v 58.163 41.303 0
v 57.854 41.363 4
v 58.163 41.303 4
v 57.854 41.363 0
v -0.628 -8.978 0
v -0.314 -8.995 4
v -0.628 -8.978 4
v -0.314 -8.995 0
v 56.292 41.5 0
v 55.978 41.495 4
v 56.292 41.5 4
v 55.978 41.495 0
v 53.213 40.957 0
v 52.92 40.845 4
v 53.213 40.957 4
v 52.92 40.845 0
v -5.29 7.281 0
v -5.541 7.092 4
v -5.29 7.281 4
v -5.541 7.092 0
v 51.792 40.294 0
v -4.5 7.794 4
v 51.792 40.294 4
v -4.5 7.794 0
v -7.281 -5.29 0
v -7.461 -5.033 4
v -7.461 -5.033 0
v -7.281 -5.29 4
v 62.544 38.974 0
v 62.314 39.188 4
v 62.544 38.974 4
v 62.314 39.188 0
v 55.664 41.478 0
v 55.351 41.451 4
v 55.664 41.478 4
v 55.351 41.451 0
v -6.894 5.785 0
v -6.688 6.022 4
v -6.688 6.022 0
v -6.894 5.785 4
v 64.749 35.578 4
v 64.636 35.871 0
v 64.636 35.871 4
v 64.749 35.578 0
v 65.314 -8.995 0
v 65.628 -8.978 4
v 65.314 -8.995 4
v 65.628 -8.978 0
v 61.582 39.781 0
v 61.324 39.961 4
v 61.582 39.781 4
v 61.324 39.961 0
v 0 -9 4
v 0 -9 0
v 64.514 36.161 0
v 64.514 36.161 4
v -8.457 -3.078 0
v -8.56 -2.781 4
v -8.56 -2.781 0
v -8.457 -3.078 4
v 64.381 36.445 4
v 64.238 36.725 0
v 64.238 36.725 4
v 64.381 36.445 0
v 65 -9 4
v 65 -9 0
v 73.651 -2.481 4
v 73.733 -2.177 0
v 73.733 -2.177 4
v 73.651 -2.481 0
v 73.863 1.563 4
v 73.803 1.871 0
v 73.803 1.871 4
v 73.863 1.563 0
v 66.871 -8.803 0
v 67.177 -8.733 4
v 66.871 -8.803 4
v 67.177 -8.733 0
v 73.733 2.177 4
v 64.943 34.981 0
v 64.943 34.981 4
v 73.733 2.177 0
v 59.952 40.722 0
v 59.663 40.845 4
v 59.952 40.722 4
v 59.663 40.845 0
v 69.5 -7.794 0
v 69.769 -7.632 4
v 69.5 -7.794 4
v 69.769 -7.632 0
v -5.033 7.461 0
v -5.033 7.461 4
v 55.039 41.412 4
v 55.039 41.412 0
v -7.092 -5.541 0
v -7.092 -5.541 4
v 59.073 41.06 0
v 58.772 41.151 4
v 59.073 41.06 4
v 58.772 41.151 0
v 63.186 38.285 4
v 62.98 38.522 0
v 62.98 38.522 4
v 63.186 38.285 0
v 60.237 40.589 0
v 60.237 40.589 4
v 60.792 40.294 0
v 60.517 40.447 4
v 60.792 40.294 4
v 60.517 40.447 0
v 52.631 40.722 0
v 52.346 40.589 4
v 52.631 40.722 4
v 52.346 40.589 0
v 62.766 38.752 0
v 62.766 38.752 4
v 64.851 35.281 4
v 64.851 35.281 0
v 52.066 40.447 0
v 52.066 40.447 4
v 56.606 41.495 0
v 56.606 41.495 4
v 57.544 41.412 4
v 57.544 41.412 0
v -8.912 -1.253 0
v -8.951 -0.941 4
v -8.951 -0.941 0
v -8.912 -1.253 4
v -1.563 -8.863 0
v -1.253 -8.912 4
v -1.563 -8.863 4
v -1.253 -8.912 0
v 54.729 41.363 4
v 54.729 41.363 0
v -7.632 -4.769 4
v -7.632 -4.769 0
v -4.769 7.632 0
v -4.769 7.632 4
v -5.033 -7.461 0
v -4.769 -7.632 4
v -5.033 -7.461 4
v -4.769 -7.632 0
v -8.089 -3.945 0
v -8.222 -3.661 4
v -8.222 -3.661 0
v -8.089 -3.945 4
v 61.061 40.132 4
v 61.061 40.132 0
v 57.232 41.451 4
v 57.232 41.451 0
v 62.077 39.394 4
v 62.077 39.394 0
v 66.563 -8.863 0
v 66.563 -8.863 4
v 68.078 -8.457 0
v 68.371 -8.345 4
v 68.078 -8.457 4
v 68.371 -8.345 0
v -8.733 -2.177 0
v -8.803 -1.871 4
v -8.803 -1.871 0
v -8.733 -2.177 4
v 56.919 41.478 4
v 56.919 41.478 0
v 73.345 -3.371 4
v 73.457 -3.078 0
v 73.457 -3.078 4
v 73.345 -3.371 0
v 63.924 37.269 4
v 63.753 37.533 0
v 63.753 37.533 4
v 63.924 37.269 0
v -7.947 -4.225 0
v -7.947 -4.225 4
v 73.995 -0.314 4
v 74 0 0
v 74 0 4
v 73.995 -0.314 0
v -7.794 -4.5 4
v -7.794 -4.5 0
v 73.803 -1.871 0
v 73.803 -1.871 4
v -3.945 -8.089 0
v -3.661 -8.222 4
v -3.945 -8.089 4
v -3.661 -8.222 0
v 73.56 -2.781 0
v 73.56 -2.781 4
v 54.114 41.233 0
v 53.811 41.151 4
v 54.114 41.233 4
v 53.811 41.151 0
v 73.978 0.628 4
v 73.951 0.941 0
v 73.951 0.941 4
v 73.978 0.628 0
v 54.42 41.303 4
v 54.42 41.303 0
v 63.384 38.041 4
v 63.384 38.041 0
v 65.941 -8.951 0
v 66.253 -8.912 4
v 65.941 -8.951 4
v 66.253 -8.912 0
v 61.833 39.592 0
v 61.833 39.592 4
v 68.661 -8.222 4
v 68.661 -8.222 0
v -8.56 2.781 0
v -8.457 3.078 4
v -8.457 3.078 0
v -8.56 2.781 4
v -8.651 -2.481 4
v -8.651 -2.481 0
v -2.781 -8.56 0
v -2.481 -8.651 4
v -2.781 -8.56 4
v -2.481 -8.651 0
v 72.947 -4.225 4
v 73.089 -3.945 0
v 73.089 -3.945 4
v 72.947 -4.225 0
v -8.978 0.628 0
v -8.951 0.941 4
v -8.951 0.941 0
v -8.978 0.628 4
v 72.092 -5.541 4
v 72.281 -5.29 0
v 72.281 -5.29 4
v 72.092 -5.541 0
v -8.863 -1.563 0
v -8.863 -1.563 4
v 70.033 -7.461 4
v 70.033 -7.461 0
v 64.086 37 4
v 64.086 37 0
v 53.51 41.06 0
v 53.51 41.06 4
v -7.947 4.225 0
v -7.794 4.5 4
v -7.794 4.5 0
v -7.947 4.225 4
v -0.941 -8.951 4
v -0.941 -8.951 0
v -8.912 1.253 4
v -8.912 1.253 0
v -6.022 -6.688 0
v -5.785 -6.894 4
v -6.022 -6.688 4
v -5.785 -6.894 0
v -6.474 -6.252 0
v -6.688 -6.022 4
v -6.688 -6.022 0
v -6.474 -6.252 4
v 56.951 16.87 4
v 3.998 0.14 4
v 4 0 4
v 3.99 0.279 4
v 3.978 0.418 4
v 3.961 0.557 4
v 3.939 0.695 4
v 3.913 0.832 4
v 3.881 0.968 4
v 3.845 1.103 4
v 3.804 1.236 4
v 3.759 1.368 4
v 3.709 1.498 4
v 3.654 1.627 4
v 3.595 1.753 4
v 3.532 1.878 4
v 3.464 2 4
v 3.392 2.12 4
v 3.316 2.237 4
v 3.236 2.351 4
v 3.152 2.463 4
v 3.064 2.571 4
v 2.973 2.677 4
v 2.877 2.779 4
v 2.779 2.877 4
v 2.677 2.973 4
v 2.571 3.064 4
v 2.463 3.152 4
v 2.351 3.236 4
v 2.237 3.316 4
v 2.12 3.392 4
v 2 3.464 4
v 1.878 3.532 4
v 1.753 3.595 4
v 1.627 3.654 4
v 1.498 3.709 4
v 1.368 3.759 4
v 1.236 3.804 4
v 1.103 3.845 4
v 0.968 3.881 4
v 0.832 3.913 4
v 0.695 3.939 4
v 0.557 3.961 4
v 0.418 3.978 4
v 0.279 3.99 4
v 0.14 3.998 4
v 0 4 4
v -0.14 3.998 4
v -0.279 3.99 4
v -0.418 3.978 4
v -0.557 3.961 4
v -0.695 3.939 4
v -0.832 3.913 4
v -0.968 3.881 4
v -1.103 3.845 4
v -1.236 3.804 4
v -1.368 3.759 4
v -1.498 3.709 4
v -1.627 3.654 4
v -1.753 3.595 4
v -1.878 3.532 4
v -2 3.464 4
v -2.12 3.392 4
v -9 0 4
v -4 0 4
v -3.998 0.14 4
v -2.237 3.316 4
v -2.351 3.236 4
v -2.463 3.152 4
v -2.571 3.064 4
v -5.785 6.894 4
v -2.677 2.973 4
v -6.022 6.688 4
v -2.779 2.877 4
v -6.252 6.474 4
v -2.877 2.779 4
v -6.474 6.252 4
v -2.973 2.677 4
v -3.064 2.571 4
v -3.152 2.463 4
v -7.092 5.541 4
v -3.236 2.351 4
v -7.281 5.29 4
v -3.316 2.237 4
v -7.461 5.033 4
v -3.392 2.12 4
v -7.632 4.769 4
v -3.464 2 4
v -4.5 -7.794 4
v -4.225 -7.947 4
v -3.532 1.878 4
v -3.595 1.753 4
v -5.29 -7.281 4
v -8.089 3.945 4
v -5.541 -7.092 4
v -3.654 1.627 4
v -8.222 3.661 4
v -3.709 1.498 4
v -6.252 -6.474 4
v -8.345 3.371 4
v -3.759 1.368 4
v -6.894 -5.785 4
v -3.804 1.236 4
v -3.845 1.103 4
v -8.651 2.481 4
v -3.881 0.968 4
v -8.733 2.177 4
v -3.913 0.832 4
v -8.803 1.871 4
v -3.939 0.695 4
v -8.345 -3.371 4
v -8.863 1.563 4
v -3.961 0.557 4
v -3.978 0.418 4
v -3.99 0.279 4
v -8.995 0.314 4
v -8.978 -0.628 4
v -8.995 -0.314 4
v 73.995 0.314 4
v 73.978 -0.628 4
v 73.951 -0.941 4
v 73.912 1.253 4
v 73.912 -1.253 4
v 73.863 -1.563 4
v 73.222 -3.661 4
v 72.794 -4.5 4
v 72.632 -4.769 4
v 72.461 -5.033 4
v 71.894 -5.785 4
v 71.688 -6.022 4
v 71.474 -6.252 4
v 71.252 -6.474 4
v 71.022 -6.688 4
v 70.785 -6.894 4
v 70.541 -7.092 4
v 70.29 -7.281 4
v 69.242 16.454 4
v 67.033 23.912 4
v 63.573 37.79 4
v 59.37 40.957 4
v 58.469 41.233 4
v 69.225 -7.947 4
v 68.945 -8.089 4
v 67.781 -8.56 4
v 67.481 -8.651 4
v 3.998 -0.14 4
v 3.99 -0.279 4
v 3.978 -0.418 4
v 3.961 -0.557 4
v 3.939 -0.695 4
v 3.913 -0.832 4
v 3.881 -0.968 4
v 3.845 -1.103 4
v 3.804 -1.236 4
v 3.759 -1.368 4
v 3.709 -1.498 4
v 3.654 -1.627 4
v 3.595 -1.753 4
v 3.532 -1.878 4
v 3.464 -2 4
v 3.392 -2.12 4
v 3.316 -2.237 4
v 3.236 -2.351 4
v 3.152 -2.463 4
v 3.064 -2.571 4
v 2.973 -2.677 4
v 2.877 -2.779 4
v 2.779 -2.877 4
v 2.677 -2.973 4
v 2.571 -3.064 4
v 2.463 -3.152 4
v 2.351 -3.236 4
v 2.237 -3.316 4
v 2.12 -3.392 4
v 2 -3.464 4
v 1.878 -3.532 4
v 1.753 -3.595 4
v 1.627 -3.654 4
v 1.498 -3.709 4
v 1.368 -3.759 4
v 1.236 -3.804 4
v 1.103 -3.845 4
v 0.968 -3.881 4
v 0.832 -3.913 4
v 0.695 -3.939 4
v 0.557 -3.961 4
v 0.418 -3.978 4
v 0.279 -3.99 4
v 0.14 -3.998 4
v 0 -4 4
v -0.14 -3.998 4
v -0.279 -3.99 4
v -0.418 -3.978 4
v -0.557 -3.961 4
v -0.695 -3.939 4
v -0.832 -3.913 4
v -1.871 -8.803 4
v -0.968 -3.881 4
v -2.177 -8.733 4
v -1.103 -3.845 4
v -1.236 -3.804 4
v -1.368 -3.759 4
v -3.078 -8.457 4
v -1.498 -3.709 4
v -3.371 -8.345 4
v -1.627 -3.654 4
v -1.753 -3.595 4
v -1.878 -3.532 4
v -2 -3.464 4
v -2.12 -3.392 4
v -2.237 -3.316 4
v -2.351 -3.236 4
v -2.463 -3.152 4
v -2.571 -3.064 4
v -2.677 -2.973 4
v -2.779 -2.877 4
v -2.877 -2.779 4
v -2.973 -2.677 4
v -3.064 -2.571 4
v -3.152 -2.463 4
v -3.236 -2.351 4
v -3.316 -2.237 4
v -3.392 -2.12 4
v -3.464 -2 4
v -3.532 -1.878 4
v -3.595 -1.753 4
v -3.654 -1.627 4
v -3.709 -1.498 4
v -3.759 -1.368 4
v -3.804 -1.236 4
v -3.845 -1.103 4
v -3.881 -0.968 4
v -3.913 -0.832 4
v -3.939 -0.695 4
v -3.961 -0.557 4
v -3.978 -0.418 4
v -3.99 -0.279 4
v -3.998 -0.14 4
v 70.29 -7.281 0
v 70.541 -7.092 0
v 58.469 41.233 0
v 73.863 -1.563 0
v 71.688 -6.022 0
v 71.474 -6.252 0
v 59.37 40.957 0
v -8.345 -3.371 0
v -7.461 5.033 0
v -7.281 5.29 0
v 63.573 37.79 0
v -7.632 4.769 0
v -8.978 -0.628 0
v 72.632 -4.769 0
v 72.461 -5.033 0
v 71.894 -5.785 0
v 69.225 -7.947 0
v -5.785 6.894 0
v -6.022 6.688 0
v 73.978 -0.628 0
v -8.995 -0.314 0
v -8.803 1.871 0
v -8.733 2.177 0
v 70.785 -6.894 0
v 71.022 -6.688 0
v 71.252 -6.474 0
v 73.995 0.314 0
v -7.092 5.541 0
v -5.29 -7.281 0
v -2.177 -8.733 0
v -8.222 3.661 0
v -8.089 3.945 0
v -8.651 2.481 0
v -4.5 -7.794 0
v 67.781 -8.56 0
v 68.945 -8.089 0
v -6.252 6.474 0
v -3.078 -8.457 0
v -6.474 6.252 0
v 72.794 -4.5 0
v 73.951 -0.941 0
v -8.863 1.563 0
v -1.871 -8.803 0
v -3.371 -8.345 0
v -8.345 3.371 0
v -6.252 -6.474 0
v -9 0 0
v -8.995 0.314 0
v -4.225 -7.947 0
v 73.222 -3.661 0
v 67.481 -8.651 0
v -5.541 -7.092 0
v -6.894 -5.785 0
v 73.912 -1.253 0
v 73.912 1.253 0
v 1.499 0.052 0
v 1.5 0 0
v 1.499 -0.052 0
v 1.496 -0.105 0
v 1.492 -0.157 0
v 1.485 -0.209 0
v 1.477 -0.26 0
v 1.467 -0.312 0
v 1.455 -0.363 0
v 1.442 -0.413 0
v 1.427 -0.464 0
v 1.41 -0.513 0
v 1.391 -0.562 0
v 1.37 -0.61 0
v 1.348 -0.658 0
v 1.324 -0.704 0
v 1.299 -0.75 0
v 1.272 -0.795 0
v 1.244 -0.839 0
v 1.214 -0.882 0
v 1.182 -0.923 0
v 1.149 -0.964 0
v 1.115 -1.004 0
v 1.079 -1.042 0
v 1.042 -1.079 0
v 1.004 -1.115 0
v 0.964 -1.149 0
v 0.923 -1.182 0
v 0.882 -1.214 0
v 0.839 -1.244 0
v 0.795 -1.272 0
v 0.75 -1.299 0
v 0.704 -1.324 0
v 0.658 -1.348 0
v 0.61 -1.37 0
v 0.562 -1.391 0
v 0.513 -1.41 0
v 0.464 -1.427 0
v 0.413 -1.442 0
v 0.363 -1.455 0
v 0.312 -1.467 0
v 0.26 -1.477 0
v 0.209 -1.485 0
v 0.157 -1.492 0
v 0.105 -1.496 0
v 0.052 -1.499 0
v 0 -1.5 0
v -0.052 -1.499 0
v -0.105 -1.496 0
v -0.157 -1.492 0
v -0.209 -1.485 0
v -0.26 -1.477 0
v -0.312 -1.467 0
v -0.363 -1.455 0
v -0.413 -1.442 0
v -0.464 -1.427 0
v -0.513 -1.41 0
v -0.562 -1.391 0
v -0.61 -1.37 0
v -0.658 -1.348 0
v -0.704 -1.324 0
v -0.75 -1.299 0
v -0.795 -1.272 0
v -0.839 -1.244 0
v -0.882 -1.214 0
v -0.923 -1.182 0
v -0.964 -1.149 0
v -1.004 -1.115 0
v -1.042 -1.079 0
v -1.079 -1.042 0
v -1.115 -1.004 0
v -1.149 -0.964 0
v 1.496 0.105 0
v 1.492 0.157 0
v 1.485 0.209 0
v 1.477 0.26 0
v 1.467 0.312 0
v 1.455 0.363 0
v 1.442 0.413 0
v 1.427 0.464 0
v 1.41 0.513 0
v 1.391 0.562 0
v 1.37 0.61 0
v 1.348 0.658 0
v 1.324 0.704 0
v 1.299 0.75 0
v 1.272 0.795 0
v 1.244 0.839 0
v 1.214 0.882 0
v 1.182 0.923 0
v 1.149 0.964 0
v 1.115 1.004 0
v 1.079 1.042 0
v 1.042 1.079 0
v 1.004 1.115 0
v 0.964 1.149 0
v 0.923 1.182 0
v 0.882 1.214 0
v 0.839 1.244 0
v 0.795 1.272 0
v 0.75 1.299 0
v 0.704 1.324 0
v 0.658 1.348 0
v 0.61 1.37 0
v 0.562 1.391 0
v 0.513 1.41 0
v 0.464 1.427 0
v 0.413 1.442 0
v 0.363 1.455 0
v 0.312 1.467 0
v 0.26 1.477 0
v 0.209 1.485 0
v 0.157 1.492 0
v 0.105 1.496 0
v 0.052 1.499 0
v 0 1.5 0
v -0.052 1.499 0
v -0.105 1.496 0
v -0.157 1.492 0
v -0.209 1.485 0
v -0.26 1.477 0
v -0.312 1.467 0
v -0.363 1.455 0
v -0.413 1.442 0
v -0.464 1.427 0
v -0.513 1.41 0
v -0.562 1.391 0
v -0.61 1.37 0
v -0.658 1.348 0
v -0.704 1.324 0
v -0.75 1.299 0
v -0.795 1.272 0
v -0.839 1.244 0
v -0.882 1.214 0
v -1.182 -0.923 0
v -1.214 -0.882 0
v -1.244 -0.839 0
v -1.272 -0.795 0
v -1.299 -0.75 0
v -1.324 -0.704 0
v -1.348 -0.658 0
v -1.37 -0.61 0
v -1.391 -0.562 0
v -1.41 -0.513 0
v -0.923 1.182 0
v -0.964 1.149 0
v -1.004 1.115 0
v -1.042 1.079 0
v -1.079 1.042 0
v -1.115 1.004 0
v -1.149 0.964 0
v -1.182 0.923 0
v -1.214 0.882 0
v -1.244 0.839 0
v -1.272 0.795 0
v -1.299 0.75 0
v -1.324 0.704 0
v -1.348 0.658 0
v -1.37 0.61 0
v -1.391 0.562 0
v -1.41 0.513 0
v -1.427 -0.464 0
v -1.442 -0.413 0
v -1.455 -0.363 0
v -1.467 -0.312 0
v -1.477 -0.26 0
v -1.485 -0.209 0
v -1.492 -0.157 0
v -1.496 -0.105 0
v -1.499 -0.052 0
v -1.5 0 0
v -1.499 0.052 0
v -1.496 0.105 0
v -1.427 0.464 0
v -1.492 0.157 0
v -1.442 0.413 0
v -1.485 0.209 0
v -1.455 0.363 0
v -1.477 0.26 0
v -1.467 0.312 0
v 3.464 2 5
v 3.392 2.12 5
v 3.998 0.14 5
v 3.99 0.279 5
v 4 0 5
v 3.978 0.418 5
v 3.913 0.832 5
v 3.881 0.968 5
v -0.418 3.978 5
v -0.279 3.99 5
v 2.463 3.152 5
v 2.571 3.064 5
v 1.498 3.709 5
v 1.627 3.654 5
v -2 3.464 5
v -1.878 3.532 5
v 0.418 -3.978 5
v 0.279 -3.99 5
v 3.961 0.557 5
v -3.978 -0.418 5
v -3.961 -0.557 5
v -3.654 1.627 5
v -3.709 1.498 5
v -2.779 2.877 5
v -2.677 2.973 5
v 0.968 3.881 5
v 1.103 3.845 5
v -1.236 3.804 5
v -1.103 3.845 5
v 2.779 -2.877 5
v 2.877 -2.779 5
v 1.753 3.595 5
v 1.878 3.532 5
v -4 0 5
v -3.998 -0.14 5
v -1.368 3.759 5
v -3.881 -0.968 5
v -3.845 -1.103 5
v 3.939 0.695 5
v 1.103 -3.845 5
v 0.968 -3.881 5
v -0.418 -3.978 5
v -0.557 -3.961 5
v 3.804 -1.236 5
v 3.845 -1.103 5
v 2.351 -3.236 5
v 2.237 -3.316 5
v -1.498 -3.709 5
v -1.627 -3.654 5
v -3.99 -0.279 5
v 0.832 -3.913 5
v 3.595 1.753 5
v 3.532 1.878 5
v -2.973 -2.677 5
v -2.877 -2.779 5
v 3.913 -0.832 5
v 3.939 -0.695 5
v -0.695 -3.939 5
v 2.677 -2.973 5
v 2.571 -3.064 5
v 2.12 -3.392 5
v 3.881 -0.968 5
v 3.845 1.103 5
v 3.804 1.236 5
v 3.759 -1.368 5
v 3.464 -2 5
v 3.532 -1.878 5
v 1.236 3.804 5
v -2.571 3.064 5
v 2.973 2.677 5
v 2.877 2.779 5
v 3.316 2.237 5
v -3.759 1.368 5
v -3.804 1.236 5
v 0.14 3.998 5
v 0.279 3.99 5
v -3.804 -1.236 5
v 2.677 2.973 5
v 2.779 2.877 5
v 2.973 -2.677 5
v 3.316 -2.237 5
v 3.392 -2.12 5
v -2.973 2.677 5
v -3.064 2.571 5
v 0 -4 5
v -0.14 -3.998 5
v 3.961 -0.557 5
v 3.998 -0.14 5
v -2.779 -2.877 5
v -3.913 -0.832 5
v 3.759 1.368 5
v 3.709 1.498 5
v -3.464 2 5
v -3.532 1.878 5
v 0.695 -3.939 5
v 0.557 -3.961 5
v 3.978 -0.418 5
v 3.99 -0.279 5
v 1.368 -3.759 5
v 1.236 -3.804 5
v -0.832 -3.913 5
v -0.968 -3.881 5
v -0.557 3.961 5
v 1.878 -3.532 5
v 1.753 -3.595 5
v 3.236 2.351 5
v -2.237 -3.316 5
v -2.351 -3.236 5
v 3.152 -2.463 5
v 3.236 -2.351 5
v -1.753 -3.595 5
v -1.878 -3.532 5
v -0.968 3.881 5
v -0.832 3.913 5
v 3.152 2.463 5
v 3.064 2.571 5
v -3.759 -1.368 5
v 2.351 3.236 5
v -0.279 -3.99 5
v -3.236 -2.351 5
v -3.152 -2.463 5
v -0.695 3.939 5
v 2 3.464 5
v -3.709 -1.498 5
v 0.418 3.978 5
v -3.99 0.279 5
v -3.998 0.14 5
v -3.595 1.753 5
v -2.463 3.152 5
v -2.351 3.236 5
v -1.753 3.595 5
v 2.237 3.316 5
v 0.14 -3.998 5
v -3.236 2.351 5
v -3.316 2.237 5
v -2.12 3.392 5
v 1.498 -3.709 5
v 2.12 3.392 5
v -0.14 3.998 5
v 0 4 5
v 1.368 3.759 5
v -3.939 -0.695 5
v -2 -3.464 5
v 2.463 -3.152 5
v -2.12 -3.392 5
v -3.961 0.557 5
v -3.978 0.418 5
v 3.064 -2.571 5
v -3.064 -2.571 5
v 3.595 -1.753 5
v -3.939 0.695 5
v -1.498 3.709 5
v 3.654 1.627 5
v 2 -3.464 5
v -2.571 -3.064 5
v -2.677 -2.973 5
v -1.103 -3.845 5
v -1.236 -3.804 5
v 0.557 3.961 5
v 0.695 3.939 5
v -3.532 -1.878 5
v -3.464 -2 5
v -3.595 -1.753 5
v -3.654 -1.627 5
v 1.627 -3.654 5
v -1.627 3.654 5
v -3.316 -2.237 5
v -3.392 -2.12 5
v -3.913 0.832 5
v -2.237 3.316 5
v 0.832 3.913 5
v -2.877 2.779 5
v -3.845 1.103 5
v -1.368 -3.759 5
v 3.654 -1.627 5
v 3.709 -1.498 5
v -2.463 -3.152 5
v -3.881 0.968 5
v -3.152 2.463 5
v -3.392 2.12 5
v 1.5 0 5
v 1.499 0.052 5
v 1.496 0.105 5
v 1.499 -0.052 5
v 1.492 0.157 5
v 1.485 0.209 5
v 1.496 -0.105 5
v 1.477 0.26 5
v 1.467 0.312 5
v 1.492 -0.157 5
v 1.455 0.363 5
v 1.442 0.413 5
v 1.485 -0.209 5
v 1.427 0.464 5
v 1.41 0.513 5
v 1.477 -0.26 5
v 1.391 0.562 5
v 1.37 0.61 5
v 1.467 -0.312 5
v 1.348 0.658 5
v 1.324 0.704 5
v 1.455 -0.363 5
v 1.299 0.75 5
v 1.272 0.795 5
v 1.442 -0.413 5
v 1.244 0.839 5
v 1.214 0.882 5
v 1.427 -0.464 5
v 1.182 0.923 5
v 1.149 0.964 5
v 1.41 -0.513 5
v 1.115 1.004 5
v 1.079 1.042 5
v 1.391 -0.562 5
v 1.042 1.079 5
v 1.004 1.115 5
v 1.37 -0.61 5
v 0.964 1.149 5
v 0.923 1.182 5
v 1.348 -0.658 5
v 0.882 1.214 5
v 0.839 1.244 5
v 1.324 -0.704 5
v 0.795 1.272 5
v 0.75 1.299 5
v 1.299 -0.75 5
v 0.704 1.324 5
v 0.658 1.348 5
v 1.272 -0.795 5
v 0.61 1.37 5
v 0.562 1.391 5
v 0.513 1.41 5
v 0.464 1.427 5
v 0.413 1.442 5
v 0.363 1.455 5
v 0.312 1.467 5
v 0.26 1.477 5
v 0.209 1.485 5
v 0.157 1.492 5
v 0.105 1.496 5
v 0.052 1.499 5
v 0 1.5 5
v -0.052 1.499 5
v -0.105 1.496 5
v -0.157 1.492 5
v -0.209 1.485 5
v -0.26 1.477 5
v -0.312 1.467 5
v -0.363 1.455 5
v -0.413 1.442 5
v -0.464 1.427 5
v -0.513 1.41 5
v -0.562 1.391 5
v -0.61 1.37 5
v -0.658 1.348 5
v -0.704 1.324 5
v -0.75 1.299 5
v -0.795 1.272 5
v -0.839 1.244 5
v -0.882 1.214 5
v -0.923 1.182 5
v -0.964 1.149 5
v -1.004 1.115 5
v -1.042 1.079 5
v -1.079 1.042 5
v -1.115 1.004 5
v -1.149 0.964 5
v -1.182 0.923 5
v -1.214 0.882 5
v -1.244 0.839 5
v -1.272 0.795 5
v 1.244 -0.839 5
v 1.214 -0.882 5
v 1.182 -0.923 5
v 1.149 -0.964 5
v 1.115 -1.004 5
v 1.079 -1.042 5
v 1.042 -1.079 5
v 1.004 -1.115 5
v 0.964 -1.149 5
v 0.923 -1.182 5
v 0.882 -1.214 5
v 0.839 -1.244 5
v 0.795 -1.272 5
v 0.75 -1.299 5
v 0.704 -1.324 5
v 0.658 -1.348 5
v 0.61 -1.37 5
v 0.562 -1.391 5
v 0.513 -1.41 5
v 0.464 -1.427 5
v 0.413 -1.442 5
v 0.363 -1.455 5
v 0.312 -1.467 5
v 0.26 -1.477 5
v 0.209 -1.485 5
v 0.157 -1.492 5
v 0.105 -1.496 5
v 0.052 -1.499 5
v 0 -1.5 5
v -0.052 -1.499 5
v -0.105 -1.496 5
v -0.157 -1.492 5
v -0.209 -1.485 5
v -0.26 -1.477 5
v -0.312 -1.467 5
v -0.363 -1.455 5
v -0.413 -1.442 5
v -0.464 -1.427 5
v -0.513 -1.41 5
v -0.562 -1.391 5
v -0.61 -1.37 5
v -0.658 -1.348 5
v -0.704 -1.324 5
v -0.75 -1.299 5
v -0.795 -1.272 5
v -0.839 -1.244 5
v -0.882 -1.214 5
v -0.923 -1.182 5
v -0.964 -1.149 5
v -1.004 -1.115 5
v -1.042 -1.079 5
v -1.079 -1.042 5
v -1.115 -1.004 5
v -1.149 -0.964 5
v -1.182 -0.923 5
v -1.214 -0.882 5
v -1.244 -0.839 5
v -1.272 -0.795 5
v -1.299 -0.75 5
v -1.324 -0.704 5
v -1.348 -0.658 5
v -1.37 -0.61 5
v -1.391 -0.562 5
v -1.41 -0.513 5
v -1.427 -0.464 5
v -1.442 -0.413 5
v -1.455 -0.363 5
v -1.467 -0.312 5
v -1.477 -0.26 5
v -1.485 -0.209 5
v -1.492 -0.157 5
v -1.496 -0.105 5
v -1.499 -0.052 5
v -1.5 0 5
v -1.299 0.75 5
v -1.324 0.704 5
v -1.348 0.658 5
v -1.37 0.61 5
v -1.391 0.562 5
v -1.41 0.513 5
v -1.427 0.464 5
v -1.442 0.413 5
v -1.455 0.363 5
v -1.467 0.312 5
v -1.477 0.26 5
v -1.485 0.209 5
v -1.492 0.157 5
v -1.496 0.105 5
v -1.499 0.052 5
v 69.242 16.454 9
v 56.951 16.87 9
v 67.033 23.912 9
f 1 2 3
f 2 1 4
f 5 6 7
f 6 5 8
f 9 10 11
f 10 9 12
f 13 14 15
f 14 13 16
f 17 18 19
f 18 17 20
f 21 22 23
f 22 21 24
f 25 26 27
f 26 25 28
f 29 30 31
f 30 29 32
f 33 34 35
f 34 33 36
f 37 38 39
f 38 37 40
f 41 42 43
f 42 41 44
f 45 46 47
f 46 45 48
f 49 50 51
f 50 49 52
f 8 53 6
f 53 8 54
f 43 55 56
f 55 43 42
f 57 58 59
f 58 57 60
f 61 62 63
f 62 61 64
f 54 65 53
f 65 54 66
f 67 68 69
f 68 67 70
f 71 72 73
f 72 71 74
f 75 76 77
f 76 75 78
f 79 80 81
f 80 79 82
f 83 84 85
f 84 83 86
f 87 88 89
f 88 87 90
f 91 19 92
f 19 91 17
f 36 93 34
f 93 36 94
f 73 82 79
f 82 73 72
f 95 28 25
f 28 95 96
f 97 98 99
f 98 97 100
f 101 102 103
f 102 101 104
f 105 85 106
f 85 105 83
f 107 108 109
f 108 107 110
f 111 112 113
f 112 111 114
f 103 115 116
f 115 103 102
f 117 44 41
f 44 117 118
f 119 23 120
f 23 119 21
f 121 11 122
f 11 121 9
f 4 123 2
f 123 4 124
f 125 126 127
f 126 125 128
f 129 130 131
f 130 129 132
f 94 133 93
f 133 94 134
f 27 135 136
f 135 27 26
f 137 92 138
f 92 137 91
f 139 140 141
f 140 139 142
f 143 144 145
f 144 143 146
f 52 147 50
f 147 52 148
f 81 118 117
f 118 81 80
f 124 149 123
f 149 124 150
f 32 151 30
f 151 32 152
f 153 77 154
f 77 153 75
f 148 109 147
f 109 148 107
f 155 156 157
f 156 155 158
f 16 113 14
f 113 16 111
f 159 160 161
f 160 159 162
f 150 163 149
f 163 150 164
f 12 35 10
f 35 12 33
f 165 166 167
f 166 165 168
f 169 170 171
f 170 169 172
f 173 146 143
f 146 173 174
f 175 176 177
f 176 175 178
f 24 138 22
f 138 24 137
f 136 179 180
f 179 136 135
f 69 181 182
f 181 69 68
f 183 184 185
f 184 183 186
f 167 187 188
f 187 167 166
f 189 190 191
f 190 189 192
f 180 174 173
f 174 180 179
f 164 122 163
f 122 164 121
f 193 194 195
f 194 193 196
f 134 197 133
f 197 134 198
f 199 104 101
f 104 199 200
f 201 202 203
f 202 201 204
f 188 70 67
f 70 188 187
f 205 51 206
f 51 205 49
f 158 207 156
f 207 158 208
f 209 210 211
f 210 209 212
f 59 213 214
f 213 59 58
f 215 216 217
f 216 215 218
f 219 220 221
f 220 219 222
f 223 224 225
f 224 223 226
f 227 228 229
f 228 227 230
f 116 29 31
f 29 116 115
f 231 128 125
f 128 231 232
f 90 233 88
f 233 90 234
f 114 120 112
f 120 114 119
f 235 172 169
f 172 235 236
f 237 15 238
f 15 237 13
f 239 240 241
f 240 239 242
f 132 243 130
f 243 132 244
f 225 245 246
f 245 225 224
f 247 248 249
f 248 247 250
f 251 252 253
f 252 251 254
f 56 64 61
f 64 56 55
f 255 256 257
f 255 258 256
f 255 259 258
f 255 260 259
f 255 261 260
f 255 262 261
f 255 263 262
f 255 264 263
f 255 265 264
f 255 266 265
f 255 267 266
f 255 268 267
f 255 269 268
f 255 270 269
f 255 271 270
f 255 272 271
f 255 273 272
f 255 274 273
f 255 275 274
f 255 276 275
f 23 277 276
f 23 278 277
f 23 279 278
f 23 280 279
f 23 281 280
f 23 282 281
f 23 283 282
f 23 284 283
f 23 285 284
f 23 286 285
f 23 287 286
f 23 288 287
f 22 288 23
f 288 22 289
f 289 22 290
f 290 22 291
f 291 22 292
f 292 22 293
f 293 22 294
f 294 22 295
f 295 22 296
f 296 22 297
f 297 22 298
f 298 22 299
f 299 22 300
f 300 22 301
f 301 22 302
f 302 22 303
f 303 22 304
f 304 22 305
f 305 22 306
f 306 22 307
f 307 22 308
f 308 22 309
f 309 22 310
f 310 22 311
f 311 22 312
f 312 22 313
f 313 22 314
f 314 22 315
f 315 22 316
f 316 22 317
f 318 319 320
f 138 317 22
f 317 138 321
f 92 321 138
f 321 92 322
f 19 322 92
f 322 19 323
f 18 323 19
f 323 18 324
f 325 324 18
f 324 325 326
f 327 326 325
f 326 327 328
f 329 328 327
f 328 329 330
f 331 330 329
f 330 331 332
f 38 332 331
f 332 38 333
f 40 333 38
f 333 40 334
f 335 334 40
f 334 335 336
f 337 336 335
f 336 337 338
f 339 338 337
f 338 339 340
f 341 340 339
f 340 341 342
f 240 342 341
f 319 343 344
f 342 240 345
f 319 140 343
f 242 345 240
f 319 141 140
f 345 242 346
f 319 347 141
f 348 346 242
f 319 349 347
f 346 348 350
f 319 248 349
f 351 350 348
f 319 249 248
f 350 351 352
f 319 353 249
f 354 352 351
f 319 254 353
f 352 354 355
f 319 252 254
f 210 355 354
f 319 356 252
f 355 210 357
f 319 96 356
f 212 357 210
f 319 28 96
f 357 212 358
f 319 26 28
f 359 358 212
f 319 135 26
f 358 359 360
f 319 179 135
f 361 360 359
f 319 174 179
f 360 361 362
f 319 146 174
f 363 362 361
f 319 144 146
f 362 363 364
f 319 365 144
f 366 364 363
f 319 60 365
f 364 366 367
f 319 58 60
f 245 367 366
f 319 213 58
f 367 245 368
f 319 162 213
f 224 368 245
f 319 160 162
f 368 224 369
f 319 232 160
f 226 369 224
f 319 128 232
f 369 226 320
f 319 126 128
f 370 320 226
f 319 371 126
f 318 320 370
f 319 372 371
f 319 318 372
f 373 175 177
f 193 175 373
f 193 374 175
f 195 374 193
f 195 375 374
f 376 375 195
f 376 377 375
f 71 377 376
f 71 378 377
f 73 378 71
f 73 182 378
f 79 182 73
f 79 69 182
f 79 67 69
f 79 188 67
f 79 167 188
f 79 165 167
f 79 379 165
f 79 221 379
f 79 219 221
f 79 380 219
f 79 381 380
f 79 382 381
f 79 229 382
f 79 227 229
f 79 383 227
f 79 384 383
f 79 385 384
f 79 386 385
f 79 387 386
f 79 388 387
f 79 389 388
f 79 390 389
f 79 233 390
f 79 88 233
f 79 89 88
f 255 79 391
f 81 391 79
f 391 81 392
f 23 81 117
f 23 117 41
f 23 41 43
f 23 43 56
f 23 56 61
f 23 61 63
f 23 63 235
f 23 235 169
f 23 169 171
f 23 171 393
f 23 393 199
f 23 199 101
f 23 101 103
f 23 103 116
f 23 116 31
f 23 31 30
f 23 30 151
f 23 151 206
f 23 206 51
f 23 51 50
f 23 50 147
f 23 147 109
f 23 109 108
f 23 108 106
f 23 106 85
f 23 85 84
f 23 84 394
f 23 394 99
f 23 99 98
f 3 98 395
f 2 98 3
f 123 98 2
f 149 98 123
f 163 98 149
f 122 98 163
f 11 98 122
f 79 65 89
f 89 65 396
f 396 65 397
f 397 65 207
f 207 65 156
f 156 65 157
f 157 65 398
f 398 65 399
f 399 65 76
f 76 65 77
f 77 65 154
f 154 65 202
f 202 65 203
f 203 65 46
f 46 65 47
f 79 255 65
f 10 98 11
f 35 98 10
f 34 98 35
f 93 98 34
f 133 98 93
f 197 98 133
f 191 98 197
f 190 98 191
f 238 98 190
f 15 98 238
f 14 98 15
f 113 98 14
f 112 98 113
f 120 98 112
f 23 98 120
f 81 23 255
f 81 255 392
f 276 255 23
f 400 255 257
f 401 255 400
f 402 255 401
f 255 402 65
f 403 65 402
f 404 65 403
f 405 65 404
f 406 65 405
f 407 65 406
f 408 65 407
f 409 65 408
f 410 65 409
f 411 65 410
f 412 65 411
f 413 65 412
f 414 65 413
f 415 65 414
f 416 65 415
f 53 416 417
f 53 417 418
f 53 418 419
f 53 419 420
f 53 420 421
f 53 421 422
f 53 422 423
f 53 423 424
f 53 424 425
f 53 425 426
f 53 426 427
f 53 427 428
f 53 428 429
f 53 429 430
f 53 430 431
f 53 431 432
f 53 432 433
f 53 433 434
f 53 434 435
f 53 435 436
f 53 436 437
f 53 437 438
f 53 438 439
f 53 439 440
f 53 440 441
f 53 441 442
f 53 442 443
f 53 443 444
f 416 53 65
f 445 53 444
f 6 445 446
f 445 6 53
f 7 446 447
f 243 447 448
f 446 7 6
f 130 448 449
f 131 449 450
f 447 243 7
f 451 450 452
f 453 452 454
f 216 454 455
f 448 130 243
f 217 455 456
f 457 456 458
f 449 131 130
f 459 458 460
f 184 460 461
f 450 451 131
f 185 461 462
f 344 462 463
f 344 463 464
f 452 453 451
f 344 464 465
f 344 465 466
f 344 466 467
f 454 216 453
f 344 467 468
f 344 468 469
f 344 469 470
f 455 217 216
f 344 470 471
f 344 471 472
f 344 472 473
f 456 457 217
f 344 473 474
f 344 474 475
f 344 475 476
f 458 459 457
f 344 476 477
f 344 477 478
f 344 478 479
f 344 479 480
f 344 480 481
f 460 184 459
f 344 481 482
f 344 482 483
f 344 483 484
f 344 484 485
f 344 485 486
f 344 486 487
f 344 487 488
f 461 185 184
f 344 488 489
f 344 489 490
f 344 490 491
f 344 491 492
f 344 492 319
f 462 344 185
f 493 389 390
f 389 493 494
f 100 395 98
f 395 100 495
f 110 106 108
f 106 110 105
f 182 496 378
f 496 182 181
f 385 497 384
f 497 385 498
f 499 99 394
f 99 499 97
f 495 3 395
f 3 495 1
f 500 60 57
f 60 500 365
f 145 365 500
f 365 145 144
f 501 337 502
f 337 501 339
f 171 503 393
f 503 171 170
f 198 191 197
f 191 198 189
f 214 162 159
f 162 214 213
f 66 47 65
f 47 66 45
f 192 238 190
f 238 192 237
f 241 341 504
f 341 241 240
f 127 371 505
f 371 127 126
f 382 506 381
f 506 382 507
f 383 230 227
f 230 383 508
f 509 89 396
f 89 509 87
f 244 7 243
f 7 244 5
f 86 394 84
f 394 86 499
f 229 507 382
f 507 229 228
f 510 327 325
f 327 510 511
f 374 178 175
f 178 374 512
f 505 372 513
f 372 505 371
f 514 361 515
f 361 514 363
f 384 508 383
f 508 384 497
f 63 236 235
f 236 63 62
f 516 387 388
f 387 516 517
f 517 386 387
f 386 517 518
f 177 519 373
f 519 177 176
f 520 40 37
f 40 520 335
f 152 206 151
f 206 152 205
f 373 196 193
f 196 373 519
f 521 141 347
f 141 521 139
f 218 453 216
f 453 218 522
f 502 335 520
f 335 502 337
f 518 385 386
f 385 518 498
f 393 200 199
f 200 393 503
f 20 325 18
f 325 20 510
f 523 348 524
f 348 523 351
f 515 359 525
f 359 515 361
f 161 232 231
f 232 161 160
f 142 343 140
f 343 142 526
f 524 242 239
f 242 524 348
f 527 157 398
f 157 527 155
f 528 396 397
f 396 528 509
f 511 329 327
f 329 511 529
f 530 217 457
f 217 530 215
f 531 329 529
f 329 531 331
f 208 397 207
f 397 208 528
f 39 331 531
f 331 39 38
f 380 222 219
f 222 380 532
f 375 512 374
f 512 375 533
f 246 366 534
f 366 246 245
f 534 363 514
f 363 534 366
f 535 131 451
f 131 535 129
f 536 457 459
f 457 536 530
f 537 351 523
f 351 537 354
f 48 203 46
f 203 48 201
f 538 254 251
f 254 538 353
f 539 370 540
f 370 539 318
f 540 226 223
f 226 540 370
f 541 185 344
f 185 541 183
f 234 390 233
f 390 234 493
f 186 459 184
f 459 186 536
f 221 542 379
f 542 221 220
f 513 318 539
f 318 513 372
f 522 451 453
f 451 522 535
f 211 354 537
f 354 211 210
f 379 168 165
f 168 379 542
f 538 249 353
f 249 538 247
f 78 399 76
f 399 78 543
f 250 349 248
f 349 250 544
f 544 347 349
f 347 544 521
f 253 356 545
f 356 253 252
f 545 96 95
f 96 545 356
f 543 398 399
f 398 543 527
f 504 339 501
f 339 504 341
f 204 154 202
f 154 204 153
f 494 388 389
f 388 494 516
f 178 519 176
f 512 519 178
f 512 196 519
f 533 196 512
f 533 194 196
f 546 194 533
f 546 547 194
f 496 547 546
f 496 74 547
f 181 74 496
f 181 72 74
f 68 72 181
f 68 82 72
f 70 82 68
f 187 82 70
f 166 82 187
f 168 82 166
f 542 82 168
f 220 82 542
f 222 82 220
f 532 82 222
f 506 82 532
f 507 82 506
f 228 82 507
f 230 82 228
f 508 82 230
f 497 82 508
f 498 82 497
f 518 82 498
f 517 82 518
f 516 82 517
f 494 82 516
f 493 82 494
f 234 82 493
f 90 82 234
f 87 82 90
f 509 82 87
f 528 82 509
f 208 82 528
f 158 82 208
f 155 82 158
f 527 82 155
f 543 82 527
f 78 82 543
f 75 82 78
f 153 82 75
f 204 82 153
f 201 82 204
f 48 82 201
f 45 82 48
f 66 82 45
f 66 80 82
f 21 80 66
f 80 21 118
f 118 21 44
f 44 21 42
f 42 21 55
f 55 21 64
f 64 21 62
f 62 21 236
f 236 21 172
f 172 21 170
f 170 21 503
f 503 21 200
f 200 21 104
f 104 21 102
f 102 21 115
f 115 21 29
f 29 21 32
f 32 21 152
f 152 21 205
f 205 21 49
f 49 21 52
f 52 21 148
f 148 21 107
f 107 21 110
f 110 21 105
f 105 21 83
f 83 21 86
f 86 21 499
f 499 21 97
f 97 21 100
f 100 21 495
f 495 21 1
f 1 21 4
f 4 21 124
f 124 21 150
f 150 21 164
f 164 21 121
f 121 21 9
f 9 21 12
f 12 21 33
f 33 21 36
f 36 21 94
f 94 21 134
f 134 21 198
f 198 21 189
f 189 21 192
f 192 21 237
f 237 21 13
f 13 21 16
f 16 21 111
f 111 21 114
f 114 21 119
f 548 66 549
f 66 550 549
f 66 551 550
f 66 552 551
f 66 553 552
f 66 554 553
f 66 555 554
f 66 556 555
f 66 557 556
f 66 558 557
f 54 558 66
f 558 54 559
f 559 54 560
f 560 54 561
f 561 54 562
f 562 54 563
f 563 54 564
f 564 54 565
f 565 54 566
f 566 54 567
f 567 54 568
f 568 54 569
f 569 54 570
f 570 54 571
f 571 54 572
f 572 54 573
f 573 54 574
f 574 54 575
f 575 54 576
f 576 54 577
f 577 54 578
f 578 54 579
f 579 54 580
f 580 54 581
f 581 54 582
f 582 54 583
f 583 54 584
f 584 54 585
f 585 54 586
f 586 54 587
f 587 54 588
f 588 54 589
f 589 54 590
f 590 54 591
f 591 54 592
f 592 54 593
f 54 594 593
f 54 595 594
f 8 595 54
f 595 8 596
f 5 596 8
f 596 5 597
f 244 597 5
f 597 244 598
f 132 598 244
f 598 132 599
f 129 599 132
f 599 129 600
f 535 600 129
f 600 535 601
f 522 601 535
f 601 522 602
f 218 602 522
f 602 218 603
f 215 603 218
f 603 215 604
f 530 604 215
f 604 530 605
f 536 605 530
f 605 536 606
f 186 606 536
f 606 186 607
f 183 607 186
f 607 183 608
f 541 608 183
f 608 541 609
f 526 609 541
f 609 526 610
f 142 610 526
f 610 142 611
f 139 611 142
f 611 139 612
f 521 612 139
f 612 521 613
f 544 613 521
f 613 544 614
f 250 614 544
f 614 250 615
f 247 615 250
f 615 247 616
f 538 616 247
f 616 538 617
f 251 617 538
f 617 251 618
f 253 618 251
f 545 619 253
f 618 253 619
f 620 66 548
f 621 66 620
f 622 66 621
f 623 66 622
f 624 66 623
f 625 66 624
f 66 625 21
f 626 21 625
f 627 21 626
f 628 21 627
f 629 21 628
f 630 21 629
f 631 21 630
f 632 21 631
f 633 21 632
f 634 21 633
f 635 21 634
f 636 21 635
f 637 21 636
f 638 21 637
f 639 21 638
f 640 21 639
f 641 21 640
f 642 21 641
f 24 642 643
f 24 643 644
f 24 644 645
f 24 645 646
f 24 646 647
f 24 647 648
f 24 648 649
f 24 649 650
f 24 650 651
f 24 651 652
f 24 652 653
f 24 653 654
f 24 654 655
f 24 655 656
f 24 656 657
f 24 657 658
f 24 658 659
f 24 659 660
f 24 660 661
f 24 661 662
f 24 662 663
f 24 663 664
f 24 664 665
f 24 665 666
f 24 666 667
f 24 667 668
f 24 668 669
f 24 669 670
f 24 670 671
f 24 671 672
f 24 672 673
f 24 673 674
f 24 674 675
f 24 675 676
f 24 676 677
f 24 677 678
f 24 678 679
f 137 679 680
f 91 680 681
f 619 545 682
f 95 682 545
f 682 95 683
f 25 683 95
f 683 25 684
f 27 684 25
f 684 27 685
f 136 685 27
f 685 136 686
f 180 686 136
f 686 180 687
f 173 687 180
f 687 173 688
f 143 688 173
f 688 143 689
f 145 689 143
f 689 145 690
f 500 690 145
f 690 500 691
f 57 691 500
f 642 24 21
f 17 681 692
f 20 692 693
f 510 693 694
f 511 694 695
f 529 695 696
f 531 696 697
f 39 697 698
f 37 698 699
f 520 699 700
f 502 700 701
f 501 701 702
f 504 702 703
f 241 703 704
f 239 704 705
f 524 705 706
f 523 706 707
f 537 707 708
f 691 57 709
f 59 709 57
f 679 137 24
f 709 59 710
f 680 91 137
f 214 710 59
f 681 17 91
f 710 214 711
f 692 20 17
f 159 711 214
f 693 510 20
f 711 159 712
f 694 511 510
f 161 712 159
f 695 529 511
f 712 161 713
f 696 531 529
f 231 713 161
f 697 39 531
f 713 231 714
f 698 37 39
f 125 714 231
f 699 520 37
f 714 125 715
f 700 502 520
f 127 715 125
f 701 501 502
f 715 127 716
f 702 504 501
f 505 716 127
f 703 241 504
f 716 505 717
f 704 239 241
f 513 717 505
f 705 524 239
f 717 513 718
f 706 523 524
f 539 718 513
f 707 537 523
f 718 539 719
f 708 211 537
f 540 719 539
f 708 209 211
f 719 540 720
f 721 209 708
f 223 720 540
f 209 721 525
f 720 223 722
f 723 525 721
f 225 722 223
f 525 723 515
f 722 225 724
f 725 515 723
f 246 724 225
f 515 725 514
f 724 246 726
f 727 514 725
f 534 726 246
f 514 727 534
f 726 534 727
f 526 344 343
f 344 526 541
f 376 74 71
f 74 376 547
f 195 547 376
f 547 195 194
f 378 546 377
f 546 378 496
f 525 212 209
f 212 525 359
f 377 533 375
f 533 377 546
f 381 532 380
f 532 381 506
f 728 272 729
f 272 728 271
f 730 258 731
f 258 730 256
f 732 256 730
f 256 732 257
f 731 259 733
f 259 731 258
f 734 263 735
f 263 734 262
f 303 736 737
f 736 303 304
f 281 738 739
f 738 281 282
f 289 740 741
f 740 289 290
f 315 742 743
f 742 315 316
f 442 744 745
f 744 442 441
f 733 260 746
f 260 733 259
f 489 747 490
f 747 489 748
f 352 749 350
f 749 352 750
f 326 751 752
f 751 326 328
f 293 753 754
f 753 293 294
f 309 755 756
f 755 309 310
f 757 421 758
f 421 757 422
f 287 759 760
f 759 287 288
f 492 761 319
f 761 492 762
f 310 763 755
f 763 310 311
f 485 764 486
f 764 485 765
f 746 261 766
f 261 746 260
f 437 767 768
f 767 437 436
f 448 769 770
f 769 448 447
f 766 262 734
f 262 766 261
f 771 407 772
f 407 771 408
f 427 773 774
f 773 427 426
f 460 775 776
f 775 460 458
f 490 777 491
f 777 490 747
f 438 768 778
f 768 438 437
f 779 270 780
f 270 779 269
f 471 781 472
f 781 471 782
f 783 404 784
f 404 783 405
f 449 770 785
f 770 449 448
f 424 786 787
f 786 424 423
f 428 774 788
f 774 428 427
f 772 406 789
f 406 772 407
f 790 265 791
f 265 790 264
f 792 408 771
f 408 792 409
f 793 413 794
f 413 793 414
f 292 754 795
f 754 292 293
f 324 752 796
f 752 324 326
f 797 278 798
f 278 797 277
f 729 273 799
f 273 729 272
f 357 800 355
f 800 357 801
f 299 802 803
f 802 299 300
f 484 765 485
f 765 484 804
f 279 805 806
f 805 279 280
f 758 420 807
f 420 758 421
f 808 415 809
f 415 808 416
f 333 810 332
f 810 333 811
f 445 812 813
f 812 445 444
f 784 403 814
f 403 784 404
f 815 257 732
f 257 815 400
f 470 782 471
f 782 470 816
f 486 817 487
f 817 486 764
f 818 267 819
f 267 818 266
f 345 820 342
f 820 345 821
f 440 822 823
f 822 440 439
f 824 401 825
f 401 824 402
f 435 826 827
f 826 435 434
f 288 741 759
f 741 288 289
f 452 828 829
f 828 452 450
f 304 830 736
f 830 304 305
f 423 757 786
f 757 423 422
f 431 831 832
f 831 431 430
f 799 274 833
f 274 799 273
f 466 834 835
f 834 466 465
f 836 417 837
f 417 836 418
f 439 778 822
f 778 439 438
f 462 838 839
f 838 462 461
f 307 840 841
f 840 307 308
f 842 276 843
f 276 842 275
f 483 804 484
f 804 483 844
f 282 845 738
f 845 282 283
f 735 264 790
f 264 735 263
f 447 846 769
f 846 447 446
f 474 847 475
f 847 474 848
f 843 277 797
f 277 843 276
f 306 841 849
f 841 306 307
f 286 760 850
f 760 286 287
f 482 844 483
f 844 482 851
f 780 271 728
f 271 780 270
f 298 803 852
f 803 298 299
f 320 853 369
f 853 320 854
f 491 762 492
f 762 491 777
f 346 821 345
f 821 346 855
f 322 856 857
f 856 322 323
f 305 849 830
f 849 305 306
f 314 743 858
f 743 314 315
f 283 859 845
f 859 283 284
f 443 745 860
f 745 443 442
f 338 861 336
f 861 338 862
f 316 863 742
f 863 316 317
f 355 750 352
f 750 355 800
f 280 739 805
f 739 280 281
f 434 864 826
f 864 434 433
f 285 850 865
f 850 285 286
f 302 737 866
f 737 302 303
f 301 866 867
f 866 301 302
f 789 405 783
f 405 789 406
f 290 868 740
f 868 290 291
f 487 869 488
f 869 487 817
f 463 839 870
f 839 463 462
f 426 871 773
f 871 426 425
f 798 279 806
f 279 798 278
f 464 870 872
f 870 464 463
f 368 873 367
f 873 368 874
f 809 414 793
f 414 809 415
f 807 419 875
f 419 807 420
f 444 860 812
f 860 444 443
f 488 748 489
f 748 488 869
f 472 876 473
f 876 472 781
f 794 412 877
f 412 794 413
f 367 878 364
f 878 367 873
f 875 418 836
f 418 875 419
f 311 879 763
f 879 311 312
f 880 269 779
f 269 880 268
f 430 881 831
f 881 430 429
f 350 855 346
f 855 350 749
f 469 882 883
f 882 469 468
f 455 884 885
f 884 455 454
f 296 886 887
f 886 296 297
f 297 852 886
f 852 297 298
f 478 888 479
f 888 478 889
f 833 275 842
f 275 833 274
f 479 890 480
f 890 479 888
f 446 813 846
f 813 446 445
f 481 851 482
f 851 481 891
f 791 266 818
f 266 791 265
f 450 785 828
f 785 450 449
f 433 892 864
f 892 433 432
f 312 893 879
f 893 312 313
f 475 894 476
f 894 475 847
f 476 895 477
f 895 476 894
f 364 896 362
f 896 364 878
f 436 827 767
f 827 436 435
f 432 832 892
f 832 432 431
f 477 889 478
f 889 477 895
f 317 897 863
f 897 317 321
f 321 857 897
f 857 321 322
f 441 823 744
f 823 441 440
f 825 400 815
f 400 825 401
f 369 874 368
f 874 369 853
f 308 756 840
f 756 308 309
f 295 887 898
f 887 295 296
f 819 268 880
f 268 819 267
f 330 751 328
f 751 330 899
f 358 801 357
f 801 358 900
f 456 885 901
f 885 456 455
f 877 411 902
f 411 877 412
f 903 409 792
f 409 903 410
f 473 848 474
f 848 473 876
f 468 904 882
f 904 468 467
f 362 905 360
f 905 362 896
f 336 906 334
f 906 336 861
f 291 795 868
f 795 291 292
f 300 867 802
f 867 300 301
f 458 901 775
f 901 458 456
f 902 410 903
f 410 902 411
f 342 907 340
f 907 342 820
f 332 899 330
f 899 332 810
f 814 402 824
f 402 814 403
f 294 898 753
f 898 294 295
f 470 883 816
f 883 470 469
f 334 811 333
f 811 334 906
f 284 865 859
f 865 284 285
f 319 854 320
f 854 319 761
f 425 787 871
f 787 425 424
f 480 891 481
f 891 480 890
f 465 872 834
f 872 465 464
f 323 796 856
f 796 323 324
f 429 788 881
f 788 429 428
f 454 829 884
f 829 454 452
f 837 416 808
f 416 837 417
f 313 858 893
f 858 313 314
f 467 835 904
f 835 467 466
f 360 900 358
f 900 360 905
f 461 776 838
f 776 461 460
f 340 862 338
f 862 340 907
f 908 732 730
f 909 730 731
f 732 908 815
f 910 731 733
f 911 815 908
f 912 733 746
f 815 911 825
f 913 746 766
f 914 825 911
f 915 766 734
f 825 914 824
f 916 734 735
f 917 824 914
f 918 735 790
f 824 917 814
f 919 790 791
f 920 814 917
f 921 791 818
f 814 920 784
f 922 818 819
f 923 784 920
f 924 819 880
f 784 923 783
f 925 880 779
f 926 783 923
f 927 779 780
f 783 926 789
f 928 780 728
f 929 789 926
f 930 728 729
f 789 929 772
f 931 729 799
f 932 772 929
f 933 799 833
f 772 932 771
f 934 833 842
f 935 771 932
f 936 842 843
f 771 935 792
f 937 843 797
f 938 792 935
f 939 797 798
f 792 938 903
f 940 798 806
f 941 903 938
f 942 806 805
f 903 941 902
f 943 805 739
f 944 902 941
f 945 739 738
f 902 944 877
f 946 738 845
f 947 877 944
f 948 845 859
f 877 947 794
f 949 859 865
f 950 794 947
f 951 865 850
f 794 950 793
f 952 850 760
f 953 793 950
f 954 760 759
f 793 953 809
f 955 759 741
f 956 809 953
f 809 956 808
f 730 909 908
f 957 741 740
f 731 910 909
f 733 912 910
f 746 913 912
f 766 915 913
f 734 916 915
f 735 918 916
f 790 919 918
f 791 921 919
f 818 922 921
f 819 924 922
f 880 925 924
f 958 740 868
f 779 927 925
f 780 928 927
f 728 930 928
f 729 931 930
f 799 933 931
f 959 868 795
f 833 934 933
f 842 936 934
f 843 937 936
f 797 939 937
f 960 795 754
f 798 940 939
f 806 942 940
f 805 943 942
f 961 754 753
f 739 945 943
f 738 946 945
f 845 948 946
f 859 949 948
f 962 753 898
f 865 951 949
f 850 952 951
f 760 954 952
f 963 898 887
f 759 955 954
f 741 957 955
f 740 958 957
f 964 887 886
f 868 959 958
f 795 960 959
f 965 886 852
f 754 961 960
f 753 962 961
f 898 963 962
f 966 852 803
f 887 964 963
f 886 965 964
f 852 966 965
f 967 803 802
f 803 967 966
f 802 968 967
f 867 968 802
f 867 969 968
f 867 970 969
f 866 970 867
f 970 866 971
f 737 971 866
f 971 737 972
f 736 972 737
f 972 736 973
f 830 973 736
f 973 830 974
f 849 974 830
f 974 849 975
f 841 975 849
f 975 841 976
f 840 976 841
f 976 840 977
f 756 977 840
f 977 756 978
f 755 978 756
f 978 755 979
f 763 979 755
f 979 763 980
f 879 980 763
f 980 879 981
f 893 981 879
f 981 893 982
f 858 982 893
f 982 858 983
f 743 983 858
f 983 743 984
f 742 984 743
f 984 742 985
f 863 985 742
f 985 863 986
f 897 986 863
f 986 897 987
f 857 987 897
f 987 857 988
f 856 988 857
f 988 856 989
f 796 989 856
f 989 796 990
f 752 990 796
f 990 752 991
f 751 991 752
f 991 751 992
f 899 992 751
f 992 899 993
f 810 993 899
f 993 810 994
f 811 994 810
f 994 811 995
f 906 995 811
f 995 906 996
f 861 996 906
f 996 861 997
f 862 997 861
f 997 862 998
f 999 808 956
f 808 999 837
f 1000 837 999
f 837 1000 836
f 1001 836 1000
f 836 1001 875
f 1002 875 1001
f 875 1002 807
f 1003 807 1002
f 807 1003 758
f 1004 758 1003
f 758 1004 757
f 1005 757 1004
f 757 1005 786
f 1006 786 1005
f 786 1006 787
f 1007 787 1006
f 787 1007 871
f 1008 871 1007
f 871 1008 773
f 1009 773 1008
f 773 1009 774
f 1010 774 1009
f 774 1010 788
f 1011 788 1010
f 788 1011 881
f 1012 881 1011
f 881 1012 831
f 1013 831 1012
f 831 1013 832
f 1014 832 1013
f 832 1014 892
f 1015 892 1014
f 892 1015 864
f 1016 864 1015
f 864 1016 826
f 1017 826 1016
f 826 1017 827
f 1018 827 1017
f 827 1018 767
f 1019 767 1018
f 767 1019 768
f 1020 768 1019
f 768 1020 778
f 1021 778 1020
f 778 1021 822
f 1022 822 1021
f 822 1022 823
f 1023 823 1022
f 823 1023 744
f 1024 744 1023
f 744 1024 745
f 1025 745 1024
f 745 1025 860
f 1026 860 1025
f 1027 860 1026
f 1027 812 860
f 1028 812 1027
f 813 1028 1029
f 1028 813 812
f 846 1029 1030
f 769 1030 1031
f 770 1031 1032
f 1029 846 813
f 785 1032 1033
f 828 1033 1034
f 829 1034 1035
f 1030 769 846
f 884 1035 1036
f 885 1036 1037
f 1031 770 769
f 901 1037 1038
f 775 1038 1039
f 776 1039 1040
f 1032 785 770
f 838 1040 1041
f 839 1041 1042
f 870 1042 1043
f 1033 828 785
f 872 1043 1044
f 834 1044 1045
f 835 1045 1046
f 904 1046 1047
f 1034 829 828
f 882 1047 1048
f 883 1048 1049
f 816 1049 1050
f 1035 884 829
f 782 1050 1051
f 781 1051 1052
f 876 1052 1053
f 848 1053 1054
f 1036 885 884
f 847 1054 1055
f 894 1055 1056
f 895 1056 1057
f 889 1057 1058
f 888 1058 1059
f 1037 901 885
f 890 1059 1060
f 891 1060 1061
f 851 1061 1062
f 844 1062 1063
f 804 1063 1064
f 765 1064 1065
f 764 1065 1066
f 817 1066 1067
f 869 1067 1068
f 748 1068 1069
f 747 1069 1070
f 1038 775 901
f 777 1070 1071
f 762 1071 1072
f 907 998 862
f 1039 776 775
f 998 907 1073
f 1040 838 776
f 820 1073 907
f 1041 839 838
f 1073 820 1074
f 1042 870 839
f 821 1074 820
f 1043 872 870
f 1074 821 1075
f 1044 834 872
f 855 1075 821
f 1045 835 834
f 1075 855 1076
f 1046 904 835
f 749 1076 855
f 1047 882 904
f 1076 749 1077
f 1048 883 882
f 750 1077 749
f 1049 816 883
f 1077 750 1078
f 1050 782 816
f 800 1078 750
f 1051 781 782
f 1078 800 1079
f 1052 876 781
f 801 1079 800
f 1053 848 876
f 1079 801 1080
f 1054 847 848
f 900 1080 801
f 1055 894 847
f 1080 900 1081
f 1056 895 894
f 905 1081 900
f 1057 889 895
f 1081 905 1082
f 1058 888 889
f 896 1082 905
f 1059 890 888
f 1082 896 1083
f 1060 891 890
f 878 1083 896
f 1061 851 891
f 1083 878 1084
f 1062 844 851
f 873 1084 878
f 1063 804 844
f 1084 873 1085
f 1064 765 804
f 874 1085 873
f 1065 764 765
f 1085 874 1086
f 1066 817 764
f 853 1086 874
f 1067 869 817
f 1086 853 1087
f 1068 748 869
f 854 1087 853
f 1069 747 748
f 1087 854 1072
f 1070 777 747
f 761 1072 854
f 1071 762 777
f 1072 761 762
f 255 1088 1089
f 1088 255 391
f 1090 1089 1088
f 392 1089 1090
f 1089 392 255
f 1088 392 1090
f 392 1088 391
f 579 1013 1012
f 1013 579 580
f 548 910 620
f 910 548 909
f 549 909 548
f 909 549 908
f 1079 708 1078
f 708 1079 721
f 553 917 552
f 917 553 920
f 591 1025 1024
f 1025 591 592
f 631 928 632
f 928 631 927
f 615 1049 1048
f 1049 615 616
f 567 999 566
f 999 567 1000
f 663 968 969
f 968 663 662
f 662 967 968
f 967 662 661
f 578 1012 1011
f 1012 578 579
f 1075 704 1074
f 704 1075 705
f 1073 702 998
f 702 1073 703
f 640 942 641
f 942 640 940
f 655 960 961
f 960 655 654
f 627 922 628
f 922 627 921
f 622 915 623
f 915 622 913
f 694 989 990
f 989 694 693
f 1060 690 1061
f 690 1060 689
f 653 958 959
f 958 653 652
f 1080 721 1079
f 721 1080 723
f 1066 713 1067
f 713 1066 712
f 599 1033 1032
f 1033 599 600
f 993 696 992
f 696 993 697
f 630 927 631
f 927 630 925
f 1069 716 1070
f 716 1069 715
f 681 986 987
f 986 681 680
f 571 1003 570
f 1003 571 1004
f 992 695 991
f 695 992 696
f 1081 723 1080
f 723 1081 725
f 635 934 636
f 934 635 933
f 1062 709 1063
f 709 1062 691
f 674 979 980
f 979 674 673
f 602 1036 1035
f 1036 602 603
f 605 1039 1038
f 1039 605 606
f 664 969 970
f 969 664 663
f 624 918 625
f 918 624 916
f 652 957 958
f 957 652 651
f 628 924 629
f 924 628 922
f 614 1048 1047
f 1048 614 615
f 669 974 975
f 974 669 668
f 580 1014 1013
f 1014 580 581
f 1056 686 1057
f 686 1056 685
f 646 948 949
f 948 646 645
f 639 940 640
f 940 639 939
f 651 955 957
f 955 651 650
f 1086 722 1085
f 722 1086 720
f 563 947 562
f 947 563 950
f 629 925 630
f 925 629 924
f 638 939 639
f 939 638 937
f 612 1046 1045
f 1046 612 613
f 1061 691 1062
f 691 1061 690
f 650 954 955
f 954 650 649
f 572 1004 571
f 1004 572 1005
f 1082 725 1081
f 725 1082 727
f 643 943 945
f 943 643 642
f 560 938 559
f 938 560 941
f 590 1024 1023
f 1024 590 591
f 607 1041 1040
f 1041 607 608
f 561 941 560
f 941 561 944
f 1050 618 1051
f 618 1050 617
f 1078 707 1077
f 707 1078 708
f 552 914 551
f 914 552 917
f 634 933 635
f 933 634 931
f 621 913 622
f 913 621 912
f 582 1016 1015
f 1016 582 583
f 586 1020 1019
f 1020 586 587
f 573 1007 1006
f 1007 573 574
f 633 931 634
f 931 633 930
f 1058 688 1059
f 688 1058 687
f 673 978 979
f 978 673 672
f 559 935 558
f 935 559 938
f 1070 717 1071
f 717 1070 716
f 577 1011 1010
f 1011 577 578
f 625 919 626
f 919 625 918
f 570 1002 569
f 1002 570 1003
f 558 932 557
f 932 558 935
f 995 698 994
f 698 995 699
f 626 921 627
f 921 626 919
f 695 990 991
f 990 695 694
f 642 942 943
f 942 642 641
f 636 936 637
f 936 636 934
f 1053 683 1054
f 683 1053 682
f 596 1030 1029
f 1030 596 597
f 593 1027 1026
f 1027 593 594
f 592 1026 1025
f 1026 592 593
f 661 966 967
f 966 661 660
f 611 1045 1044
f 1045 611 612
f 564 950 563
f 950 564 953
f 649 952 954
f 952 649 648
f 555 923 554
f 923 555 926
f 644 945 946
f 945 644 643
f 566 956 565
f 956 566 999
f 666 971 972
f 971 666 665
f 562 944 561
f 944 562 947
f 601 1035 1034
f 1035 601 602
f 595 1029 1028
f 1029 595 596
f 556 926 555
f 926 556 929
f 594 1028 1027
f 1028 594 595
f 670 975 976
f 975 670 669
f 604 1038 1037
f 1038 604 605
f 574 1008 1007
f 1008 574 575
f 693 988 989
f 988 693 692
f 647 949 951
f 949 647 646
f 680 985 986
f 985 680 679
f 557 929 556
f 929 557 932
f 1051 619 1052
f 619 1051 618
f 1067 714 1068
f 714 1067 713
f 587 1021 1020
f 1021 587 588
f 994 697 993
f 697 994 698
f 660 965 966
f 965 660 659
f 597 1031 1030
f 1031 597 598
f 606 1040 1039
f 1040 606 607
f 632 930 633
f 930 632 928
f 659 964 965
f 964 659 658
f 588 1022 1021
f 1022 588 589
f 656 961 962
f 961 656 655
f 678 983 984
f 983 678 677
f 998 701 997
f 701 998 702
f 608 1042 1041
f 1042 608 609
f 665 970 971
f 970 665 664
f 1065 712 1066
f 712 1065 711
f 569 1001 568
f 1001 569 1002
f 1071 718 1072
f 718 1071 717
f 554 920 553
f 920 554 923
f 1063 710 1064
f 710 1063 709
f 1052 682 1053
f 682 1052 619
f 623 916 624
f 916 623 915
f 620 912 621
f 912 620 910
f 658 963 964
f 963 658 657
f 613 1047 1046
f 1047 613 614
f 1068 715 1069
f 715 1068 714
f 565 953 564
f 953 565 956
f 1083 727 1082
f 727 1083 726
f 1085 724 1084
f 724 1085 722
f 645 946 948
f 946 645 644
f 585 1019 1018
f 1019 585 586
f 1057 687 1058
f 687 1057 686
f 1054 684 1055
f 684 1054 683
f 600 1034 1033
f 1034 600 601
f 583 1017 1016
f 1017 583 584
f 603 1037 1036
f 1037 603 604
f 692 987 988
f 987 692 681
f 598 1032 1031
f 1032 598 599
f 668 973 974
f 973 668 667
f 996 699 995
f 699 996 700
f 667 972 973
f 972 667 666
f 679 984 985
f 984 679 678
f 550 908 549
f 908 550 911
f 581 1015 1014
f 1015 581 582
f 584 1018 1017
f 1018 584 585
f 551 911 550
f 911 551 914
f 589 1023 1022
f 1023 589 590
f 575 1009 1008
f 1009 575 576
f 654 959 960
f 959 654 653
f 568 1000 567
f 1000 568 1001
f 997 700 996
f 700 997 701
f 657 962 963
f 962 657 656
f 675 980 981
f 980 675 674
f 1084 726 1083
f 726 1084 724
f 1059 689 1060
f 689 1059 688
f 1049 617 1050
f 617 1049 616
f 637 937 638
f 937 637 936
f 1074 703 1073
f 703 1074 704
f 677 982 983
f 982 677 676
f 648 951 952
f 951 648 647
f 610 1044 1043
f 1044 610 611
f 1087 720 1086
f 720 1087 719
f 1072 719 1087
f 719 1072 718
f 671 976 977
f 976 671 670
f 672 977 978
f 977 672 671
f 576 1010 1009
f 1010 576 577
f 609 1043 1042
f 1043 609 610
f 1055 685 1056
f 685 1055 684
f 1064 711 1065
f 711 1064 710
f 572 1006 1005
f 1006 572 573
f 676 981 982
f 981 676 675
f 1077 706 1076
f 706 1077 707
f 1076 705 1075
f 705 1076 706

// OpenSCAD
$fn=180;

//gauge();
arm();

module gauge() {
	labels = ["0","1","2","3","4","5","6","7","8","9","0","1","2","3"];
	difference() {
		union() {
			hull() {
				difference() {
					union() {
						cylinder(h=4,d=118);
					}
					union() {
						rotate(-3.6,[0,0,1]) translate([0,-80,-1]) cube([80,80,10]);
						translate([-80,-80,-1]) cube([80,160,10]);
					}
				}
				cylinder(h=4,d=10);
			}
			color("red") for (index =[0:12]) {
				angle = index * -7.2;
				rotate(41.4 + angle,[0,0,1]) translate([38.5,38.5,4]) {
					linear_extrude(1) polygon([[3,3],[0,-2.5],[-2.5,0]]);
				}
				rotate(-1.5 + angle,[0,0,1]) translate([0,46,4]) {
					linear_extrude(1) text(labels[index],size=5,font="Arial:style=bold");
				}
			}
			cylinder(h=6,d=10);
		}
		union() {
			translate([0,0,-1]) cylinder(h=2.5,d=8.5);
			translate([0,0,-4]) cylinder(h=11,d=2.5,$fn=6);
		}
	}
}

module arm() {
	difference() {
		union() {
			hull() {
				cylinder(h=4,d=18);
				translate([65,0,0]) cylinder(h=4,d=18);
				rotate(30,[0,0,1]) translate([65,0,0]) cylinder(h=4,d=18);
			}
			cylinder(h=5,d=8);
			color("red") rotate(-28.5,[0,0,1]) translate([42,42,4]) linear_extrude(5) polygon([[0,0],[5.5,11],[11,5.5]]);
		}
		union() {
			translate([0,0,-1]) cylinder(h=10,d=3);
		}
	}
}
